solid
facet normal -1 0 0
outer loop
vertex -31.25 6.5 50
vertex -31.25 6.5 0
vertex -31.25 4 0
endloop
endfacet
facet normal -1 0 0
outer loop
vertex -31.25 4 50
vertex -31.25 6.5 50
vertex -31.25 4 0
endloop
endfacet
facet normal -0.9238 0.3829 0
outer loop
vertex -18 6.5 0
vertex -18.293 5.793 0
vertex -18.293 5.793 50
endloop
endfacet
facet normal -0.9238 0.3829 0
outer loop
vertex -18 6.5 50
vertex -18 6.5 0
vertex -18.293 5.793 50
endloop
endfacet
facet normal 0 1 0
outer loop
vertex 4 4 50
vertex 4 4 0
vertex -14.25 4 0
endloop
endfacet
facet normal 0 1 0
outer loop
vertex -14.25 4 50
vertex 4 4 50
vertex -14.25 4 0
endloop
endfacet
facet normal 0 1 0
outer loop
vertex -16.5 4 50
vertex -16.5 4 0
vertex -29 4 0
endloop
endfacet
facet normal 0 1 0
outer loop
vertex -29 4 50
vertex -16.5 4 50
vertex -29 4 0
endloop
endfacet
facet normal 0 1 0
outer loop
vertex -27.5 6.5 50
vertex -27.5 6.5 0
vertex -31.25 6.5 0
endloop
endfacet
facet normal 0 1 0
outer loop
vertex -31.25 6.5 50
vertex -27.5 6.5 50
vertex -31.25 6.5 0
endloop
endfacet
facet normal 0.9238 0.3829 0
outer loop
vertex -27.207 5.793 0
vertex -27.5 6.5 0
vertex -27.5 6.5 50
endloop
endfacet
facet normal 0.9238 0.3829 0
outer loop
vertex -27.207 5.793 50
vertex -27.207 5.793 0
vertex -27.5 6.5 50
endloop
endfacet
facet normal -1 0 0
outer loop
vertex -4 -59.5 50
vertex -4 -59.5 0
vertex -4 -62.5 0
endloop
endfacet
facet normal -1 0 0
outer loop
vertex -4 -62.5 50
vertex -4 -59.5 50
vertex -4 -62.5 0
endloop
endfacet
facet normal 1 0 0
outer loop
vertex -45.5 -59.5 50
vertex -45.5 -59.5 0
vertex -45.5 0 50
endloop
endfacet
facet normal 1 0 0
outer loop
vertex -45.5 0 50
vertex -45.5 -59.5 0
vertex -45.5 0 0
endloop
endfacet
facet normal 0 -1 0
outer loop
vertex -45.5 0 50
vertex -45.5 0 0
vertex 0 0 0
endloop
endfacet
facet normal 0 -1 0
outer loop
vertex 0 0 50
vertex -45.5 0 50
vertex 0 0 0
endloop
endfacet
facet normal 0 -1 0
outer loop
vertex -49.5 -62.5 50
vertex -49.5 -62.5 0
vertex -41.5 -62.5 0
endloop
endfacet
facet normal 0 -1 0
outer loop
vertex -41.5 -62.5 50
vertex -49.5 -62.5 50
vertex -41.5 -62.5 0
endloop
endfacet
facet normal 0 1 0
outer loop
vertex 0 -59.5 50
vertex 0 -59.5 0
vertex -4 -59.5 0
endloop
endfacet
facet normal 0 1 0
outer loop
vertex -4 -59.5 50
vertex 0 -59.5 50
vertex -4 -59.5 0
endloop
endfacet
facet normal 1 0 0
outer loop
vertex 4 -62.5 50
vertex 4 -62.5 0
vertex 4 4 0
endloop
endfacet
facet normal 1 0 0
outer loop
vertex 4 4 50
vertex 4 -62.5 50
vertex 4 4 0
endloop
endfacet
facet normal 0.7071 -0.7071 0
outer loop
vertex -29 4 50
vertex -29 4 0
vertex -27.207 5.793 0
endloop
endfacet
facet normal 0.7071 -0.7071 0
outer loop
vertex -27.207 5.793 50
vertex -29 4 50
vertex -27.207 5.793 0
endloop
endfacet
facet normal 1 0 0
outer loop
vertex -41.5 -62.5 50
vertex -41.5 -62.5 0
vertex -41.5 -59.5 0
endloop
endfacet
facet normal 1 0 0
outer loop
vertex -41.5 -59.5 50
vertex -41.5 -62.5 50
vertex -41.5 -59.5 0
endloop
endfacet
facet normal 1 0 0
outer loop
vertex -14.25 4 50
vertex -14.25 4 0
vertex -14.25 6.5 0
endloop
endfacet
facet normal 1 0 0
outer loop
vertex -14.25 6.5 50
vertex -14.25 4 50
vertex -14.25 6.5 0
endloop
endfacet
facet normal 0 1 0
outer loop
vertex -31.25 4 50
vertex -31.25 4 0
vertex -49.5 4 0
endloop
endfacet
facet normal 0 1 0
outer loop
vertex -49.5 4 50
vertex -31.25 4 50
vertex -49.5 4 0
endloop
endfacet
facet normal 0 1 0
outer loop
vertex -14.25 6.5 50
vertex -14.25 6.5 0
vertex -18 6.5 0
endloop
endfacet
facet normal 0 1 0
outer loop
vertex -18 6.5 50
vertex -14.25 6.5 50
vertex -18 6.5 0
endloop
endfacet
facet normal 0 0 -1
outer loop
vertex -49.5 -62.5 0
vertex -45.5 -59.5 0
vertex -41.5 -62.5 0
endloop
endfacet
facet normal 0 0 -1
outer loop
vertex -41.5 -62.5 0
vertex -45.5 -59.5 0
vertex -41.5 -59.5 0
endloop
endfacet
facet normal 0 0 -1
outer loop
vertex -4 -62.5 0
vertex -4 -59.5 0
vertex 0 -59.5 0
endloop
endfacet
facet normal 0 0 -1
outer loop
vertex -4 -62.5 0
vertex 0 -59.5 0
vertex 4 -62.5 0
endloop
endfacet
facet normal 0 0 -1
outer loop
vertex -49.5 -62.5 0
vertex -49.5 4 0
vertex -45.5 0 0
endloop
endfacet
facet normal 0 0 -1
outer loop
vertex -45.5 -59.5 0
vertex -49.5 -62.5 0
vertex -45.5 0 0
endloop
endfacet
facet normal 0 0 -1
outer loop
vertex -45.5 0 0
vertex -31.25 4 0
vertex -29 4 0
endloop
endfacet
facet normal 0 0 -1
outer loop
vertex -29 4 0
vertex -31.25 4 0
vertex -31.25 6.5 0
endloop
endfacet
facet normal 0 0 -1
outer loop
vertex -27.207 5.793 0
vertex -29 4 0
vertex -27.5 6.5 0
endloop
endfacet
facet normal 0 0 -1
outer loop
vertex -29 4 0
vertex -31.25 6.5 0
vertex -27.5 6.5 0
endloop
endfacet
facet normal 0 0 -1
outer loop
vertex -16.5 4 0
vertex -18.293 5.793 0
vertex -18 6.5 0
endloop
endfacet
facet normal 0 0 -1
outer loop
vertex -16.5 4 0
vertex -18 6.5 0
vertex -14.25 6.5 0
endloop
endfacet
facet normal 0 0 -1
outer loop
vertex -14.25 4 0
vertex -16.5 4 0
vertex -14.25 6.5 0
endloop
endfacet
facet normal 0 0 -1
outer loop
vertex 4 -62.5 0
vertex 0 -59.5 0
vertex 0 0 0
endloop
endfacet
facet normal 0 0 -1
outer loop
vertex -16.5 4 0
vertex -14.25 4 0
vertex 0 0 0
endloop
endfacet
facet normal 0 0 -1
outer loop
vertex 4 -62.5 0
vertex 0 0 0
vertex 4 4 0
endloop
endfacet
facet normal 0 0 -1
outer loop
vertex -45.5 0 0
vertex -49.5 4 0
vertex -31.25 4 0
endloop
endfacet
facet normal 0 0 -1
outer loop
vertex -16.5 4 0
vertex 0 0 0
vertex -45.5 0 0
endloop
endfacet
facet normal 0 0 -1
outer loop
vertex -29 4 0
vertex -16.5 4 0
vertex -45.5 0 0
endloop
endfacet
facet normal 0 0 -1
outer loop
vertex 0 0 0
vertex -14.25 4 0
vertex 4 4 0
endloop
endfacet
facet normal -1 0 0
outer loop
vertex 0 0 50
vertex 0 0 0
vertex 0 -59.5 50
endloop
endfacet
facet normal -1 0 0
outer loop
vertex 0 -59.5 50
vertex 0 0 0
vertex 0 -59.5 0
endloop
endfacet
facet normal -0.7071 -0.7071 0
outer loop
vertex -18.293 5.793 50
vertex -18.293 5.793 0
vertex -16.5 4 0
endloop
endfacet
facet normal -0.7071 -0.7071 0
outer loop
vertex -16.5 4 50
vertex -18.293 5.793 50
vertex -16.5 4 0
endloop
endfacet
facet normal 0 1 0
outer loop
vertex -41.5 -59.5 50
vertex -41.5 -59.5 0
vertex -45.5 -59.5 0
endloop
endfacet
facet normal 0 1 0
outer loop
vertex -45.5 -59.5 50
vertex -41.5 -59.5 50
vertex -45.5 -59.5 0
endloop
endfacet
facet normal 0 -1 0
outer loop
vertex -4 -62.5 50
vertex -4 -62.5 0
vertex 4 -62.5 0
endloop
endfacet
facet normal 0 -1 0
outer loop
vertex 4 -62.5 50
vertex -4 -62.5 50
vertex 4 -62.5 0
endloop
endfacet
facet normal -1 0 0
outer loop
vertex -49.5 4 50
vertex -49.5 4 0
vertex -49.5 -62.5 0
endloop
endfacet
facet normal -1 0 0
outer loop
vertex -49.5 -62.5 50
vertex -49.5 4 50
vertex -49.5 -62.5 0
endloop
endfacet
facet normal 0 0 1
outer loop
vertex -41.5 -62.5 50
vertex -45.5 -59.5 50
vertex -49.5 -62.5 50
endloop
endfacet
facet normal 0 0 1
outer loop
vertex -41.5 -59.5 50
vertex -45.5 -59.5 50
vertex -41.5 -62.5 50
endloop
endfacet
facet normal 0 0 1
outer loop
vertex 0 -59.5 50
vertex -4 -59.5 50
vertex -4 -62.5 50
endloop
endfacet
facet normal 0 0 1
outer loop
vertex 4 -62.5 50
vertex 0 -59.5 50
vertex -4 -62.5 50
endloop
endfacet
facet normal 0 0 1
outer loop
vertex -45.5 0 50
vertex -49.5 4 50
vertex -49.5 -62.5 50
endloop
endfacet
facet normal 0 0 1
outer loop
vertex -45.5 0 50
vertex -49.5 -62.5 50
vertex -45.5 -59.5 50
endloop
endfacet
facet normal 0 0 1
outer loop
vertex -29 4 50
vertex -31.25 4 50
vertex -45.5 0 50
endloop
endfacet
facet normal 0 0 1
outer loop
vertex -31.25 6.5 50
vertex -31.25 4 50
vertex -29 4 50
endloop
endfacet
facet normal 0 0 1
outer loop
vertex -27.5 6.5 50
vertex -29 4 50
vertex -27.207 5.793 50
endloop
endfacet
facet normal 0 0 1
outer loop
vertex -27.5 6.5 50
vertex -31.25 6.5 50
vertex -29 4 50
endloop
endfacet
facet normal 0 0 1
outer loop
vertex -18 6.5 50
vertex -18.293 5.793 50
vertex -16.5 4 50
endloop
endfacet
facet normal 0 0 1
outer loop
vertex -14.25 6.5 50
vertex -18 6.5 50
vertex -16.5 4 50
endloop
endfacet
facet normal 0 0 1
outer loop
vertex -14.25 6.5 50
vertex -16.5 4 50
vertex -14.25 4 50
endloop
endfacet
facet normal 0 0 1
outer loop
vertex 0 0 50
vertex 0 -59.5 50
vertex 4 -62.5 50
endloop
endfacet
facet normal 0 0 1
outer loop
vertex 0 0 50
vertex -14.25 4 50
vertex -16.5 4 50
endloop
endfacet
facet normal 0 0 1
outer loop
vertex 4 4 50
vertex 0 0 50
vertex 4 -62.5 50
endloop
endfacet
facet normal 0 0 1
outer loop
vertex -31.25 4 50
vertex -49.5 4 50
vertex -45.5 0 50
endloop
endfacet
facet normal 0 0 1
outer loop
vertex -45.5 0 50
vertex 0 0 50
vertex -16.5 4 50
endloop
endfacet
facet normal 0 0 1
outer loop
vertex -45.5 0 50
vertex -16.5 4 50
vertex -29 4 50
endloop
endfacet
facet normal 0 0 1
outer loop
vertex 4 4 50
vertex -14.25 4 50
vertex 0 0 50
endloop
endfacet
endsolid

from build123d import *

# Parameters (mm, degrees)
F1_DEPTH = 50
F2_SIZE  = 1


with BuildPart() as f1:
    # F0 (on Top) → F1 (new body)
    with BuildSketch(Plane.XY):
        Polygon((-45.5, 0), (0, 0), (0, -59.5), (-4, -59.5), (-4, -62.5), (4, -62.5), (4, 4), (-14.25, 4), (-16.5, 4), (-29, 4), (-31.25, 4), (-49.5, 4), (-49.5, -62.5), (-41.5, -62.5), (-41.5, -59.5), (-45.5, -59.5), align=None)
        Polygon((-16.5, 4), (-14.25, 4), (-14.25, 6.5), (-19, 6.5), align=None)
        Polygon((-31.25, 6.5), (-31.25, 4), (-29, 4), (-26.5, 6.5), align=None)
    extrude(amount=F1_DEPTH)

    # F2
    f2_edges = [f1.edges().sort_by_distance(p)[0] for p in [
        (-19, 6.5, 25),
        (-26.5, 6.5, 25),
    ]]
    chamfer(f2_edges, length=F2_SIZE)


solid = f1.part
